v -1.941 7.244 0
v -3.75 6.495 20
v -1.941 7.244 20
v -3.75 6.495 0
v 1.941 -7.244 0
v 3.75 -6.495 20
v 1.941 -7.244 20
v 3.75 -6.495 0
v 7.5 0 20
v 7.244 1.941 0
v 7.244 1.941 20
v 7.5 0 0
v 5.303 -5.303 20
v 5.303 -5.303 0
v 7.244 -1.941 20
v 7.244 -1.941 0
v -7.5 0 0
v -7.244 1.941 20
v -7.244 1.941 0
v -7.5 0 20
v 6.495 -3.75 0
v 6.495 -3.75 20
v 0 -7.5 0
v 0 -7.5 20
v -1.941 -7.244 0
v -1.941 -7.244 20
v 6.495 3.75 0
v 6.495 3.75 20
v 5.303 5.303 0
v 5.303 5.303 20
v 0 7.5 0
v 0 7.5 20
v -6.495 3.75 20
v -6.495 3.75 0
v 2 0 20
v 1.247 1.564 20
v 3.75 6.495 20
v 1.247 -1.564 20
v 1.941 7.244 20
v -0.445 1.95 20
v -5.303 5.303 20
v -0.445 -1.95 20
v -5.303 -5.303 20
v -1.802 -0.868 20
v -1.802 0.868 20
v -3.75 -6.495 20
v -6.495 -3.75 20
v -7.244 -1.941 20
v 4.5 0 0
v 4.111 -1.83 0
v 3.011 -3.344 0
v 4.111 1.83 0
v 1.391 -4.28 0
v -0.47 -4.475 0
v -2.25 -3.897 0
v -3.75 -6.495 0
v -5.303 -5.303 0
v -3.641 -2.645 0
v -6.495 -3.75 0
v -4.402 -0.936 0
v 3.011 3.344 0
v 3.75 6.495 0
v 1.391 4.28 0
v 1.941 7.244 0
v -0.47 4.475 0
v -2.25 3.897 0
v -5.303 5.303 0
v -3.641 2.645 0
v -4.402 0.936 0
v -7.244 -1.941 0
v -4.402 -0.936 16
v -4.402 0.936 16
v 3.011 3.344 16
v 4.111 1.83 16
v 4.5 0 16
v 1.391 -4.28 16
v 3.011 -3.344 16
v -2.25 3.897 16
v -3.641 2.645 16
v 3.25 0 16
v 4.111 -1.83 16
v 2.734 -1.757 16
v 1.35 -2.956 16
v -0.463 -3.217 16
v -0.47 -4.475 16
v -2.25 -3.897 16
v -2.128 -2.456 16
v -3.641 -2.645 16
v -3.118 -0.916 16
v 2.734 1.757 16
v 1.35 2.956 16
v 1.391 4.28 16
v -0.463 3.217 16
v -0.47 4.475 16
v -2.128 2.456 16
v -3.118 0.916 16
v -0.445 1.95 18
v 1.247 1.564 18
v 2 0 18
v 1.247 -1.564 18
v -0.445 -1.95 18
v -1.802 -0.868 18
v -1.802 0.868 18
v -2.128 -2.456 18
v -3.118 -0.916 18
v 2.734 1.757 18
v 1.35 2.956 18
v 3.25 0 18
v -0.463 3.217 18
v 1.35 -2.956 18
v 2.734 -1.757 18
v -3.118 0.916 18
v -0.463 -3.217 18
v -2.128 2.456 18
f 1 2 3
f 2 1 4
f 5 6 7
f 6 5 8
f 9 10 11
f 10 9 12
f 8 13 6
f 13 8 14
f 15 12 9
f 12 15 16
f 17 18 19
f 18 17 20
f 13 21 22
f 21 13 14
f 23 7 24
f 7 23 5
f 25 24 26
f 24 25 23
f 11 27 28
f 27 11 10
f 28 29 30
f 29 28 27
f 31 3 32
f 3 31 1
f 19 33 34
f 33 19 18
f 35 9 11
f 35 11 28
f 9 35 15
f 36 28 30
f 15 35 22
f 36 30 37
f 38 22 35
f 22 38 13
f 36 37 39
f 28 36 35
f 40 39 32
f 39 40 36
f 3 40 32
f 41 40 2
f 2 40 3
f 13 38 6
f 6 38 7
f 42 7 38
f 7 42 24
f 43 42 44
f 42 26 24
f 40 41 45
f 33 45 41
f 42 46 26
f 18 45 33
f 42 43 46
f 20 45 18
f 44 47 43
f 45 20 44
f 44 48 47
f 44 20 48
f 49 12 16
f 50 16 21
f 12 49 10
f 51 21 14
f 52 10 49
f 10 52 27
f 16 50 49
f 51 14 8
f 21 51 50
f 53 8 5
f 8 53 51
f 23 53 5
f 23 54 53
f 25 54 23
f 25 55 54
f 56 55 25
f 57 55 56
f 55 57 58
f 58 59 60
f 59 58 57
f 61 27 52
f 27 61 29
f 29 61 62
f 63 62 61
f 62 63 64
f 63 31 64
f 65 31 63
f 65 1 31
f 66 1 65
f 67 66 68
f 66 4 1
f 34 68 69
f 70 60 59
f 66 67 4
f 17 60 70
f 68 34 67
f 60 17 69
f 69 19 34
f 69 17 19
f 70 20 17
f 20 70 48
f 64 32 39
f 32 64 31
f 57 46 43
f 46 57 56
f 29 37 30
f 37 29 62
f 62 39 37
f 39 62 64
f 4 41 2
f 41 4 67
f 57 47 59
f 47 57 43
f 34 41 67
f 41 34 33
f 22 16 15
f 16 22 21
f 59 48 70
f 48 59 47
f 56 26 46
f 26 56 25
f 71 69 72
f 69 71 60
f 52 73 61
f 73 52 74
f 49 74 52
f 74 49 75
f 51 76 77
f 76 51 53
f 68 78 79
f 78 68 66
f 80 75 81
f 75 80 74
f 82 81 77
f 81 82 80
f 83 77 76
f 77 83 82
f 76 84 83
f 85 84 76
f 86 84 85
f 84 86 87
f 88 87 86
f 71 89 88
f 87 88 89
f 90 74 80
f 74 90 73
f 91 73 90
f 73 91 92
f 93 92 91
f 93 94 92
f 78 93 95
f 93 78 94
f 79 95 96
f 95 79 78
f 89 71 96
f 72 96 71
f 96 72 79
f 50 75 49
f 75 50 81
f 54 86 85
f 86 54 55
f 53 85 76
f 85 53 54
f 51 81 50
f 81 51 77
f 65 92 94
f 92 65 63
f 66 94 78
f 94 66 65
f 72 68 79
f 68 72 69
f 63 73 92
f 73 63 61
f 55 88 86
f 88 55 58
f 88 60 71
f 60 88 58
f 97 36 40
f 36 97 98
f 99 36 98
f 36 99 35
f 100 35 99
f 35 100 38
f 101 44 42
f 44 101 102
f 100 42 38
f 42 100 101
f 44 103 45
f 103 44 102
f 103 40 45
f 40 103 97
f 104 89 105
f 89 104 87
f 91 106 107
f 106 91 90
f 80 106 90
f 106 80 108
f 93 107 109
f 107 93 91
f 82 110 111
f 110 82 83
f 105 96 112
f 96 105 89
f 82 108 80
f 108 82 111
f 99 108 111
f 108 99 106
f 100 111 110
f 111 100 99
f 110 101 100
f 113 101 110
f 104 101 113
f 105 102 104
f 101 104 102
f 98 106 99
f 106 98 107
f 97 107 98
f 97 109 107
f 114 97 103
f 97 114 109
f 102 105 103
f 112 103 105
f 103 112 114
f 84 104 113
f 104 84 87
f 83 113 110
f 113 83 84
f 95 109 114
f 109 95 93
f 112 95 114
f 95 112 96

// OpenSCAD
// [FL_INDEX: keywords="openscad, 3d_parametric, OpenBeam_Optical_Rail_Simple_Rod_Holder, csg_solid" | COT="Parametric OpenSCAD design from 3DCodeverse"]
// Title: OpenBeam Optical Rail Simple Rod Holder

// The base for  the open optics rail made from Open Beam
// holds a 13mm smooth rod


//Variables
w=15; //Width of Open Beam
d=9; // rod diameter
x =6.5; //width of screw head
g =2; //heigth of screw head with some margin
z =4; //width of screw thread with margin
i=2; //screw heigth
a=20; //total heigth

module base(){
				difference(){
			difference(){
		difference (){
		cylinder(a, w/2,w/2);//whole chuck
		cylinder(a-g*2,d/2,d/2); //magnet hole
				}
			cylinder(a,z/2,z/2); //screw hole	
					}
				translate ([0,0,a-g-2])
				cylinder(g,x/2,x/2); //head of screw hole
						}
		}

base();
